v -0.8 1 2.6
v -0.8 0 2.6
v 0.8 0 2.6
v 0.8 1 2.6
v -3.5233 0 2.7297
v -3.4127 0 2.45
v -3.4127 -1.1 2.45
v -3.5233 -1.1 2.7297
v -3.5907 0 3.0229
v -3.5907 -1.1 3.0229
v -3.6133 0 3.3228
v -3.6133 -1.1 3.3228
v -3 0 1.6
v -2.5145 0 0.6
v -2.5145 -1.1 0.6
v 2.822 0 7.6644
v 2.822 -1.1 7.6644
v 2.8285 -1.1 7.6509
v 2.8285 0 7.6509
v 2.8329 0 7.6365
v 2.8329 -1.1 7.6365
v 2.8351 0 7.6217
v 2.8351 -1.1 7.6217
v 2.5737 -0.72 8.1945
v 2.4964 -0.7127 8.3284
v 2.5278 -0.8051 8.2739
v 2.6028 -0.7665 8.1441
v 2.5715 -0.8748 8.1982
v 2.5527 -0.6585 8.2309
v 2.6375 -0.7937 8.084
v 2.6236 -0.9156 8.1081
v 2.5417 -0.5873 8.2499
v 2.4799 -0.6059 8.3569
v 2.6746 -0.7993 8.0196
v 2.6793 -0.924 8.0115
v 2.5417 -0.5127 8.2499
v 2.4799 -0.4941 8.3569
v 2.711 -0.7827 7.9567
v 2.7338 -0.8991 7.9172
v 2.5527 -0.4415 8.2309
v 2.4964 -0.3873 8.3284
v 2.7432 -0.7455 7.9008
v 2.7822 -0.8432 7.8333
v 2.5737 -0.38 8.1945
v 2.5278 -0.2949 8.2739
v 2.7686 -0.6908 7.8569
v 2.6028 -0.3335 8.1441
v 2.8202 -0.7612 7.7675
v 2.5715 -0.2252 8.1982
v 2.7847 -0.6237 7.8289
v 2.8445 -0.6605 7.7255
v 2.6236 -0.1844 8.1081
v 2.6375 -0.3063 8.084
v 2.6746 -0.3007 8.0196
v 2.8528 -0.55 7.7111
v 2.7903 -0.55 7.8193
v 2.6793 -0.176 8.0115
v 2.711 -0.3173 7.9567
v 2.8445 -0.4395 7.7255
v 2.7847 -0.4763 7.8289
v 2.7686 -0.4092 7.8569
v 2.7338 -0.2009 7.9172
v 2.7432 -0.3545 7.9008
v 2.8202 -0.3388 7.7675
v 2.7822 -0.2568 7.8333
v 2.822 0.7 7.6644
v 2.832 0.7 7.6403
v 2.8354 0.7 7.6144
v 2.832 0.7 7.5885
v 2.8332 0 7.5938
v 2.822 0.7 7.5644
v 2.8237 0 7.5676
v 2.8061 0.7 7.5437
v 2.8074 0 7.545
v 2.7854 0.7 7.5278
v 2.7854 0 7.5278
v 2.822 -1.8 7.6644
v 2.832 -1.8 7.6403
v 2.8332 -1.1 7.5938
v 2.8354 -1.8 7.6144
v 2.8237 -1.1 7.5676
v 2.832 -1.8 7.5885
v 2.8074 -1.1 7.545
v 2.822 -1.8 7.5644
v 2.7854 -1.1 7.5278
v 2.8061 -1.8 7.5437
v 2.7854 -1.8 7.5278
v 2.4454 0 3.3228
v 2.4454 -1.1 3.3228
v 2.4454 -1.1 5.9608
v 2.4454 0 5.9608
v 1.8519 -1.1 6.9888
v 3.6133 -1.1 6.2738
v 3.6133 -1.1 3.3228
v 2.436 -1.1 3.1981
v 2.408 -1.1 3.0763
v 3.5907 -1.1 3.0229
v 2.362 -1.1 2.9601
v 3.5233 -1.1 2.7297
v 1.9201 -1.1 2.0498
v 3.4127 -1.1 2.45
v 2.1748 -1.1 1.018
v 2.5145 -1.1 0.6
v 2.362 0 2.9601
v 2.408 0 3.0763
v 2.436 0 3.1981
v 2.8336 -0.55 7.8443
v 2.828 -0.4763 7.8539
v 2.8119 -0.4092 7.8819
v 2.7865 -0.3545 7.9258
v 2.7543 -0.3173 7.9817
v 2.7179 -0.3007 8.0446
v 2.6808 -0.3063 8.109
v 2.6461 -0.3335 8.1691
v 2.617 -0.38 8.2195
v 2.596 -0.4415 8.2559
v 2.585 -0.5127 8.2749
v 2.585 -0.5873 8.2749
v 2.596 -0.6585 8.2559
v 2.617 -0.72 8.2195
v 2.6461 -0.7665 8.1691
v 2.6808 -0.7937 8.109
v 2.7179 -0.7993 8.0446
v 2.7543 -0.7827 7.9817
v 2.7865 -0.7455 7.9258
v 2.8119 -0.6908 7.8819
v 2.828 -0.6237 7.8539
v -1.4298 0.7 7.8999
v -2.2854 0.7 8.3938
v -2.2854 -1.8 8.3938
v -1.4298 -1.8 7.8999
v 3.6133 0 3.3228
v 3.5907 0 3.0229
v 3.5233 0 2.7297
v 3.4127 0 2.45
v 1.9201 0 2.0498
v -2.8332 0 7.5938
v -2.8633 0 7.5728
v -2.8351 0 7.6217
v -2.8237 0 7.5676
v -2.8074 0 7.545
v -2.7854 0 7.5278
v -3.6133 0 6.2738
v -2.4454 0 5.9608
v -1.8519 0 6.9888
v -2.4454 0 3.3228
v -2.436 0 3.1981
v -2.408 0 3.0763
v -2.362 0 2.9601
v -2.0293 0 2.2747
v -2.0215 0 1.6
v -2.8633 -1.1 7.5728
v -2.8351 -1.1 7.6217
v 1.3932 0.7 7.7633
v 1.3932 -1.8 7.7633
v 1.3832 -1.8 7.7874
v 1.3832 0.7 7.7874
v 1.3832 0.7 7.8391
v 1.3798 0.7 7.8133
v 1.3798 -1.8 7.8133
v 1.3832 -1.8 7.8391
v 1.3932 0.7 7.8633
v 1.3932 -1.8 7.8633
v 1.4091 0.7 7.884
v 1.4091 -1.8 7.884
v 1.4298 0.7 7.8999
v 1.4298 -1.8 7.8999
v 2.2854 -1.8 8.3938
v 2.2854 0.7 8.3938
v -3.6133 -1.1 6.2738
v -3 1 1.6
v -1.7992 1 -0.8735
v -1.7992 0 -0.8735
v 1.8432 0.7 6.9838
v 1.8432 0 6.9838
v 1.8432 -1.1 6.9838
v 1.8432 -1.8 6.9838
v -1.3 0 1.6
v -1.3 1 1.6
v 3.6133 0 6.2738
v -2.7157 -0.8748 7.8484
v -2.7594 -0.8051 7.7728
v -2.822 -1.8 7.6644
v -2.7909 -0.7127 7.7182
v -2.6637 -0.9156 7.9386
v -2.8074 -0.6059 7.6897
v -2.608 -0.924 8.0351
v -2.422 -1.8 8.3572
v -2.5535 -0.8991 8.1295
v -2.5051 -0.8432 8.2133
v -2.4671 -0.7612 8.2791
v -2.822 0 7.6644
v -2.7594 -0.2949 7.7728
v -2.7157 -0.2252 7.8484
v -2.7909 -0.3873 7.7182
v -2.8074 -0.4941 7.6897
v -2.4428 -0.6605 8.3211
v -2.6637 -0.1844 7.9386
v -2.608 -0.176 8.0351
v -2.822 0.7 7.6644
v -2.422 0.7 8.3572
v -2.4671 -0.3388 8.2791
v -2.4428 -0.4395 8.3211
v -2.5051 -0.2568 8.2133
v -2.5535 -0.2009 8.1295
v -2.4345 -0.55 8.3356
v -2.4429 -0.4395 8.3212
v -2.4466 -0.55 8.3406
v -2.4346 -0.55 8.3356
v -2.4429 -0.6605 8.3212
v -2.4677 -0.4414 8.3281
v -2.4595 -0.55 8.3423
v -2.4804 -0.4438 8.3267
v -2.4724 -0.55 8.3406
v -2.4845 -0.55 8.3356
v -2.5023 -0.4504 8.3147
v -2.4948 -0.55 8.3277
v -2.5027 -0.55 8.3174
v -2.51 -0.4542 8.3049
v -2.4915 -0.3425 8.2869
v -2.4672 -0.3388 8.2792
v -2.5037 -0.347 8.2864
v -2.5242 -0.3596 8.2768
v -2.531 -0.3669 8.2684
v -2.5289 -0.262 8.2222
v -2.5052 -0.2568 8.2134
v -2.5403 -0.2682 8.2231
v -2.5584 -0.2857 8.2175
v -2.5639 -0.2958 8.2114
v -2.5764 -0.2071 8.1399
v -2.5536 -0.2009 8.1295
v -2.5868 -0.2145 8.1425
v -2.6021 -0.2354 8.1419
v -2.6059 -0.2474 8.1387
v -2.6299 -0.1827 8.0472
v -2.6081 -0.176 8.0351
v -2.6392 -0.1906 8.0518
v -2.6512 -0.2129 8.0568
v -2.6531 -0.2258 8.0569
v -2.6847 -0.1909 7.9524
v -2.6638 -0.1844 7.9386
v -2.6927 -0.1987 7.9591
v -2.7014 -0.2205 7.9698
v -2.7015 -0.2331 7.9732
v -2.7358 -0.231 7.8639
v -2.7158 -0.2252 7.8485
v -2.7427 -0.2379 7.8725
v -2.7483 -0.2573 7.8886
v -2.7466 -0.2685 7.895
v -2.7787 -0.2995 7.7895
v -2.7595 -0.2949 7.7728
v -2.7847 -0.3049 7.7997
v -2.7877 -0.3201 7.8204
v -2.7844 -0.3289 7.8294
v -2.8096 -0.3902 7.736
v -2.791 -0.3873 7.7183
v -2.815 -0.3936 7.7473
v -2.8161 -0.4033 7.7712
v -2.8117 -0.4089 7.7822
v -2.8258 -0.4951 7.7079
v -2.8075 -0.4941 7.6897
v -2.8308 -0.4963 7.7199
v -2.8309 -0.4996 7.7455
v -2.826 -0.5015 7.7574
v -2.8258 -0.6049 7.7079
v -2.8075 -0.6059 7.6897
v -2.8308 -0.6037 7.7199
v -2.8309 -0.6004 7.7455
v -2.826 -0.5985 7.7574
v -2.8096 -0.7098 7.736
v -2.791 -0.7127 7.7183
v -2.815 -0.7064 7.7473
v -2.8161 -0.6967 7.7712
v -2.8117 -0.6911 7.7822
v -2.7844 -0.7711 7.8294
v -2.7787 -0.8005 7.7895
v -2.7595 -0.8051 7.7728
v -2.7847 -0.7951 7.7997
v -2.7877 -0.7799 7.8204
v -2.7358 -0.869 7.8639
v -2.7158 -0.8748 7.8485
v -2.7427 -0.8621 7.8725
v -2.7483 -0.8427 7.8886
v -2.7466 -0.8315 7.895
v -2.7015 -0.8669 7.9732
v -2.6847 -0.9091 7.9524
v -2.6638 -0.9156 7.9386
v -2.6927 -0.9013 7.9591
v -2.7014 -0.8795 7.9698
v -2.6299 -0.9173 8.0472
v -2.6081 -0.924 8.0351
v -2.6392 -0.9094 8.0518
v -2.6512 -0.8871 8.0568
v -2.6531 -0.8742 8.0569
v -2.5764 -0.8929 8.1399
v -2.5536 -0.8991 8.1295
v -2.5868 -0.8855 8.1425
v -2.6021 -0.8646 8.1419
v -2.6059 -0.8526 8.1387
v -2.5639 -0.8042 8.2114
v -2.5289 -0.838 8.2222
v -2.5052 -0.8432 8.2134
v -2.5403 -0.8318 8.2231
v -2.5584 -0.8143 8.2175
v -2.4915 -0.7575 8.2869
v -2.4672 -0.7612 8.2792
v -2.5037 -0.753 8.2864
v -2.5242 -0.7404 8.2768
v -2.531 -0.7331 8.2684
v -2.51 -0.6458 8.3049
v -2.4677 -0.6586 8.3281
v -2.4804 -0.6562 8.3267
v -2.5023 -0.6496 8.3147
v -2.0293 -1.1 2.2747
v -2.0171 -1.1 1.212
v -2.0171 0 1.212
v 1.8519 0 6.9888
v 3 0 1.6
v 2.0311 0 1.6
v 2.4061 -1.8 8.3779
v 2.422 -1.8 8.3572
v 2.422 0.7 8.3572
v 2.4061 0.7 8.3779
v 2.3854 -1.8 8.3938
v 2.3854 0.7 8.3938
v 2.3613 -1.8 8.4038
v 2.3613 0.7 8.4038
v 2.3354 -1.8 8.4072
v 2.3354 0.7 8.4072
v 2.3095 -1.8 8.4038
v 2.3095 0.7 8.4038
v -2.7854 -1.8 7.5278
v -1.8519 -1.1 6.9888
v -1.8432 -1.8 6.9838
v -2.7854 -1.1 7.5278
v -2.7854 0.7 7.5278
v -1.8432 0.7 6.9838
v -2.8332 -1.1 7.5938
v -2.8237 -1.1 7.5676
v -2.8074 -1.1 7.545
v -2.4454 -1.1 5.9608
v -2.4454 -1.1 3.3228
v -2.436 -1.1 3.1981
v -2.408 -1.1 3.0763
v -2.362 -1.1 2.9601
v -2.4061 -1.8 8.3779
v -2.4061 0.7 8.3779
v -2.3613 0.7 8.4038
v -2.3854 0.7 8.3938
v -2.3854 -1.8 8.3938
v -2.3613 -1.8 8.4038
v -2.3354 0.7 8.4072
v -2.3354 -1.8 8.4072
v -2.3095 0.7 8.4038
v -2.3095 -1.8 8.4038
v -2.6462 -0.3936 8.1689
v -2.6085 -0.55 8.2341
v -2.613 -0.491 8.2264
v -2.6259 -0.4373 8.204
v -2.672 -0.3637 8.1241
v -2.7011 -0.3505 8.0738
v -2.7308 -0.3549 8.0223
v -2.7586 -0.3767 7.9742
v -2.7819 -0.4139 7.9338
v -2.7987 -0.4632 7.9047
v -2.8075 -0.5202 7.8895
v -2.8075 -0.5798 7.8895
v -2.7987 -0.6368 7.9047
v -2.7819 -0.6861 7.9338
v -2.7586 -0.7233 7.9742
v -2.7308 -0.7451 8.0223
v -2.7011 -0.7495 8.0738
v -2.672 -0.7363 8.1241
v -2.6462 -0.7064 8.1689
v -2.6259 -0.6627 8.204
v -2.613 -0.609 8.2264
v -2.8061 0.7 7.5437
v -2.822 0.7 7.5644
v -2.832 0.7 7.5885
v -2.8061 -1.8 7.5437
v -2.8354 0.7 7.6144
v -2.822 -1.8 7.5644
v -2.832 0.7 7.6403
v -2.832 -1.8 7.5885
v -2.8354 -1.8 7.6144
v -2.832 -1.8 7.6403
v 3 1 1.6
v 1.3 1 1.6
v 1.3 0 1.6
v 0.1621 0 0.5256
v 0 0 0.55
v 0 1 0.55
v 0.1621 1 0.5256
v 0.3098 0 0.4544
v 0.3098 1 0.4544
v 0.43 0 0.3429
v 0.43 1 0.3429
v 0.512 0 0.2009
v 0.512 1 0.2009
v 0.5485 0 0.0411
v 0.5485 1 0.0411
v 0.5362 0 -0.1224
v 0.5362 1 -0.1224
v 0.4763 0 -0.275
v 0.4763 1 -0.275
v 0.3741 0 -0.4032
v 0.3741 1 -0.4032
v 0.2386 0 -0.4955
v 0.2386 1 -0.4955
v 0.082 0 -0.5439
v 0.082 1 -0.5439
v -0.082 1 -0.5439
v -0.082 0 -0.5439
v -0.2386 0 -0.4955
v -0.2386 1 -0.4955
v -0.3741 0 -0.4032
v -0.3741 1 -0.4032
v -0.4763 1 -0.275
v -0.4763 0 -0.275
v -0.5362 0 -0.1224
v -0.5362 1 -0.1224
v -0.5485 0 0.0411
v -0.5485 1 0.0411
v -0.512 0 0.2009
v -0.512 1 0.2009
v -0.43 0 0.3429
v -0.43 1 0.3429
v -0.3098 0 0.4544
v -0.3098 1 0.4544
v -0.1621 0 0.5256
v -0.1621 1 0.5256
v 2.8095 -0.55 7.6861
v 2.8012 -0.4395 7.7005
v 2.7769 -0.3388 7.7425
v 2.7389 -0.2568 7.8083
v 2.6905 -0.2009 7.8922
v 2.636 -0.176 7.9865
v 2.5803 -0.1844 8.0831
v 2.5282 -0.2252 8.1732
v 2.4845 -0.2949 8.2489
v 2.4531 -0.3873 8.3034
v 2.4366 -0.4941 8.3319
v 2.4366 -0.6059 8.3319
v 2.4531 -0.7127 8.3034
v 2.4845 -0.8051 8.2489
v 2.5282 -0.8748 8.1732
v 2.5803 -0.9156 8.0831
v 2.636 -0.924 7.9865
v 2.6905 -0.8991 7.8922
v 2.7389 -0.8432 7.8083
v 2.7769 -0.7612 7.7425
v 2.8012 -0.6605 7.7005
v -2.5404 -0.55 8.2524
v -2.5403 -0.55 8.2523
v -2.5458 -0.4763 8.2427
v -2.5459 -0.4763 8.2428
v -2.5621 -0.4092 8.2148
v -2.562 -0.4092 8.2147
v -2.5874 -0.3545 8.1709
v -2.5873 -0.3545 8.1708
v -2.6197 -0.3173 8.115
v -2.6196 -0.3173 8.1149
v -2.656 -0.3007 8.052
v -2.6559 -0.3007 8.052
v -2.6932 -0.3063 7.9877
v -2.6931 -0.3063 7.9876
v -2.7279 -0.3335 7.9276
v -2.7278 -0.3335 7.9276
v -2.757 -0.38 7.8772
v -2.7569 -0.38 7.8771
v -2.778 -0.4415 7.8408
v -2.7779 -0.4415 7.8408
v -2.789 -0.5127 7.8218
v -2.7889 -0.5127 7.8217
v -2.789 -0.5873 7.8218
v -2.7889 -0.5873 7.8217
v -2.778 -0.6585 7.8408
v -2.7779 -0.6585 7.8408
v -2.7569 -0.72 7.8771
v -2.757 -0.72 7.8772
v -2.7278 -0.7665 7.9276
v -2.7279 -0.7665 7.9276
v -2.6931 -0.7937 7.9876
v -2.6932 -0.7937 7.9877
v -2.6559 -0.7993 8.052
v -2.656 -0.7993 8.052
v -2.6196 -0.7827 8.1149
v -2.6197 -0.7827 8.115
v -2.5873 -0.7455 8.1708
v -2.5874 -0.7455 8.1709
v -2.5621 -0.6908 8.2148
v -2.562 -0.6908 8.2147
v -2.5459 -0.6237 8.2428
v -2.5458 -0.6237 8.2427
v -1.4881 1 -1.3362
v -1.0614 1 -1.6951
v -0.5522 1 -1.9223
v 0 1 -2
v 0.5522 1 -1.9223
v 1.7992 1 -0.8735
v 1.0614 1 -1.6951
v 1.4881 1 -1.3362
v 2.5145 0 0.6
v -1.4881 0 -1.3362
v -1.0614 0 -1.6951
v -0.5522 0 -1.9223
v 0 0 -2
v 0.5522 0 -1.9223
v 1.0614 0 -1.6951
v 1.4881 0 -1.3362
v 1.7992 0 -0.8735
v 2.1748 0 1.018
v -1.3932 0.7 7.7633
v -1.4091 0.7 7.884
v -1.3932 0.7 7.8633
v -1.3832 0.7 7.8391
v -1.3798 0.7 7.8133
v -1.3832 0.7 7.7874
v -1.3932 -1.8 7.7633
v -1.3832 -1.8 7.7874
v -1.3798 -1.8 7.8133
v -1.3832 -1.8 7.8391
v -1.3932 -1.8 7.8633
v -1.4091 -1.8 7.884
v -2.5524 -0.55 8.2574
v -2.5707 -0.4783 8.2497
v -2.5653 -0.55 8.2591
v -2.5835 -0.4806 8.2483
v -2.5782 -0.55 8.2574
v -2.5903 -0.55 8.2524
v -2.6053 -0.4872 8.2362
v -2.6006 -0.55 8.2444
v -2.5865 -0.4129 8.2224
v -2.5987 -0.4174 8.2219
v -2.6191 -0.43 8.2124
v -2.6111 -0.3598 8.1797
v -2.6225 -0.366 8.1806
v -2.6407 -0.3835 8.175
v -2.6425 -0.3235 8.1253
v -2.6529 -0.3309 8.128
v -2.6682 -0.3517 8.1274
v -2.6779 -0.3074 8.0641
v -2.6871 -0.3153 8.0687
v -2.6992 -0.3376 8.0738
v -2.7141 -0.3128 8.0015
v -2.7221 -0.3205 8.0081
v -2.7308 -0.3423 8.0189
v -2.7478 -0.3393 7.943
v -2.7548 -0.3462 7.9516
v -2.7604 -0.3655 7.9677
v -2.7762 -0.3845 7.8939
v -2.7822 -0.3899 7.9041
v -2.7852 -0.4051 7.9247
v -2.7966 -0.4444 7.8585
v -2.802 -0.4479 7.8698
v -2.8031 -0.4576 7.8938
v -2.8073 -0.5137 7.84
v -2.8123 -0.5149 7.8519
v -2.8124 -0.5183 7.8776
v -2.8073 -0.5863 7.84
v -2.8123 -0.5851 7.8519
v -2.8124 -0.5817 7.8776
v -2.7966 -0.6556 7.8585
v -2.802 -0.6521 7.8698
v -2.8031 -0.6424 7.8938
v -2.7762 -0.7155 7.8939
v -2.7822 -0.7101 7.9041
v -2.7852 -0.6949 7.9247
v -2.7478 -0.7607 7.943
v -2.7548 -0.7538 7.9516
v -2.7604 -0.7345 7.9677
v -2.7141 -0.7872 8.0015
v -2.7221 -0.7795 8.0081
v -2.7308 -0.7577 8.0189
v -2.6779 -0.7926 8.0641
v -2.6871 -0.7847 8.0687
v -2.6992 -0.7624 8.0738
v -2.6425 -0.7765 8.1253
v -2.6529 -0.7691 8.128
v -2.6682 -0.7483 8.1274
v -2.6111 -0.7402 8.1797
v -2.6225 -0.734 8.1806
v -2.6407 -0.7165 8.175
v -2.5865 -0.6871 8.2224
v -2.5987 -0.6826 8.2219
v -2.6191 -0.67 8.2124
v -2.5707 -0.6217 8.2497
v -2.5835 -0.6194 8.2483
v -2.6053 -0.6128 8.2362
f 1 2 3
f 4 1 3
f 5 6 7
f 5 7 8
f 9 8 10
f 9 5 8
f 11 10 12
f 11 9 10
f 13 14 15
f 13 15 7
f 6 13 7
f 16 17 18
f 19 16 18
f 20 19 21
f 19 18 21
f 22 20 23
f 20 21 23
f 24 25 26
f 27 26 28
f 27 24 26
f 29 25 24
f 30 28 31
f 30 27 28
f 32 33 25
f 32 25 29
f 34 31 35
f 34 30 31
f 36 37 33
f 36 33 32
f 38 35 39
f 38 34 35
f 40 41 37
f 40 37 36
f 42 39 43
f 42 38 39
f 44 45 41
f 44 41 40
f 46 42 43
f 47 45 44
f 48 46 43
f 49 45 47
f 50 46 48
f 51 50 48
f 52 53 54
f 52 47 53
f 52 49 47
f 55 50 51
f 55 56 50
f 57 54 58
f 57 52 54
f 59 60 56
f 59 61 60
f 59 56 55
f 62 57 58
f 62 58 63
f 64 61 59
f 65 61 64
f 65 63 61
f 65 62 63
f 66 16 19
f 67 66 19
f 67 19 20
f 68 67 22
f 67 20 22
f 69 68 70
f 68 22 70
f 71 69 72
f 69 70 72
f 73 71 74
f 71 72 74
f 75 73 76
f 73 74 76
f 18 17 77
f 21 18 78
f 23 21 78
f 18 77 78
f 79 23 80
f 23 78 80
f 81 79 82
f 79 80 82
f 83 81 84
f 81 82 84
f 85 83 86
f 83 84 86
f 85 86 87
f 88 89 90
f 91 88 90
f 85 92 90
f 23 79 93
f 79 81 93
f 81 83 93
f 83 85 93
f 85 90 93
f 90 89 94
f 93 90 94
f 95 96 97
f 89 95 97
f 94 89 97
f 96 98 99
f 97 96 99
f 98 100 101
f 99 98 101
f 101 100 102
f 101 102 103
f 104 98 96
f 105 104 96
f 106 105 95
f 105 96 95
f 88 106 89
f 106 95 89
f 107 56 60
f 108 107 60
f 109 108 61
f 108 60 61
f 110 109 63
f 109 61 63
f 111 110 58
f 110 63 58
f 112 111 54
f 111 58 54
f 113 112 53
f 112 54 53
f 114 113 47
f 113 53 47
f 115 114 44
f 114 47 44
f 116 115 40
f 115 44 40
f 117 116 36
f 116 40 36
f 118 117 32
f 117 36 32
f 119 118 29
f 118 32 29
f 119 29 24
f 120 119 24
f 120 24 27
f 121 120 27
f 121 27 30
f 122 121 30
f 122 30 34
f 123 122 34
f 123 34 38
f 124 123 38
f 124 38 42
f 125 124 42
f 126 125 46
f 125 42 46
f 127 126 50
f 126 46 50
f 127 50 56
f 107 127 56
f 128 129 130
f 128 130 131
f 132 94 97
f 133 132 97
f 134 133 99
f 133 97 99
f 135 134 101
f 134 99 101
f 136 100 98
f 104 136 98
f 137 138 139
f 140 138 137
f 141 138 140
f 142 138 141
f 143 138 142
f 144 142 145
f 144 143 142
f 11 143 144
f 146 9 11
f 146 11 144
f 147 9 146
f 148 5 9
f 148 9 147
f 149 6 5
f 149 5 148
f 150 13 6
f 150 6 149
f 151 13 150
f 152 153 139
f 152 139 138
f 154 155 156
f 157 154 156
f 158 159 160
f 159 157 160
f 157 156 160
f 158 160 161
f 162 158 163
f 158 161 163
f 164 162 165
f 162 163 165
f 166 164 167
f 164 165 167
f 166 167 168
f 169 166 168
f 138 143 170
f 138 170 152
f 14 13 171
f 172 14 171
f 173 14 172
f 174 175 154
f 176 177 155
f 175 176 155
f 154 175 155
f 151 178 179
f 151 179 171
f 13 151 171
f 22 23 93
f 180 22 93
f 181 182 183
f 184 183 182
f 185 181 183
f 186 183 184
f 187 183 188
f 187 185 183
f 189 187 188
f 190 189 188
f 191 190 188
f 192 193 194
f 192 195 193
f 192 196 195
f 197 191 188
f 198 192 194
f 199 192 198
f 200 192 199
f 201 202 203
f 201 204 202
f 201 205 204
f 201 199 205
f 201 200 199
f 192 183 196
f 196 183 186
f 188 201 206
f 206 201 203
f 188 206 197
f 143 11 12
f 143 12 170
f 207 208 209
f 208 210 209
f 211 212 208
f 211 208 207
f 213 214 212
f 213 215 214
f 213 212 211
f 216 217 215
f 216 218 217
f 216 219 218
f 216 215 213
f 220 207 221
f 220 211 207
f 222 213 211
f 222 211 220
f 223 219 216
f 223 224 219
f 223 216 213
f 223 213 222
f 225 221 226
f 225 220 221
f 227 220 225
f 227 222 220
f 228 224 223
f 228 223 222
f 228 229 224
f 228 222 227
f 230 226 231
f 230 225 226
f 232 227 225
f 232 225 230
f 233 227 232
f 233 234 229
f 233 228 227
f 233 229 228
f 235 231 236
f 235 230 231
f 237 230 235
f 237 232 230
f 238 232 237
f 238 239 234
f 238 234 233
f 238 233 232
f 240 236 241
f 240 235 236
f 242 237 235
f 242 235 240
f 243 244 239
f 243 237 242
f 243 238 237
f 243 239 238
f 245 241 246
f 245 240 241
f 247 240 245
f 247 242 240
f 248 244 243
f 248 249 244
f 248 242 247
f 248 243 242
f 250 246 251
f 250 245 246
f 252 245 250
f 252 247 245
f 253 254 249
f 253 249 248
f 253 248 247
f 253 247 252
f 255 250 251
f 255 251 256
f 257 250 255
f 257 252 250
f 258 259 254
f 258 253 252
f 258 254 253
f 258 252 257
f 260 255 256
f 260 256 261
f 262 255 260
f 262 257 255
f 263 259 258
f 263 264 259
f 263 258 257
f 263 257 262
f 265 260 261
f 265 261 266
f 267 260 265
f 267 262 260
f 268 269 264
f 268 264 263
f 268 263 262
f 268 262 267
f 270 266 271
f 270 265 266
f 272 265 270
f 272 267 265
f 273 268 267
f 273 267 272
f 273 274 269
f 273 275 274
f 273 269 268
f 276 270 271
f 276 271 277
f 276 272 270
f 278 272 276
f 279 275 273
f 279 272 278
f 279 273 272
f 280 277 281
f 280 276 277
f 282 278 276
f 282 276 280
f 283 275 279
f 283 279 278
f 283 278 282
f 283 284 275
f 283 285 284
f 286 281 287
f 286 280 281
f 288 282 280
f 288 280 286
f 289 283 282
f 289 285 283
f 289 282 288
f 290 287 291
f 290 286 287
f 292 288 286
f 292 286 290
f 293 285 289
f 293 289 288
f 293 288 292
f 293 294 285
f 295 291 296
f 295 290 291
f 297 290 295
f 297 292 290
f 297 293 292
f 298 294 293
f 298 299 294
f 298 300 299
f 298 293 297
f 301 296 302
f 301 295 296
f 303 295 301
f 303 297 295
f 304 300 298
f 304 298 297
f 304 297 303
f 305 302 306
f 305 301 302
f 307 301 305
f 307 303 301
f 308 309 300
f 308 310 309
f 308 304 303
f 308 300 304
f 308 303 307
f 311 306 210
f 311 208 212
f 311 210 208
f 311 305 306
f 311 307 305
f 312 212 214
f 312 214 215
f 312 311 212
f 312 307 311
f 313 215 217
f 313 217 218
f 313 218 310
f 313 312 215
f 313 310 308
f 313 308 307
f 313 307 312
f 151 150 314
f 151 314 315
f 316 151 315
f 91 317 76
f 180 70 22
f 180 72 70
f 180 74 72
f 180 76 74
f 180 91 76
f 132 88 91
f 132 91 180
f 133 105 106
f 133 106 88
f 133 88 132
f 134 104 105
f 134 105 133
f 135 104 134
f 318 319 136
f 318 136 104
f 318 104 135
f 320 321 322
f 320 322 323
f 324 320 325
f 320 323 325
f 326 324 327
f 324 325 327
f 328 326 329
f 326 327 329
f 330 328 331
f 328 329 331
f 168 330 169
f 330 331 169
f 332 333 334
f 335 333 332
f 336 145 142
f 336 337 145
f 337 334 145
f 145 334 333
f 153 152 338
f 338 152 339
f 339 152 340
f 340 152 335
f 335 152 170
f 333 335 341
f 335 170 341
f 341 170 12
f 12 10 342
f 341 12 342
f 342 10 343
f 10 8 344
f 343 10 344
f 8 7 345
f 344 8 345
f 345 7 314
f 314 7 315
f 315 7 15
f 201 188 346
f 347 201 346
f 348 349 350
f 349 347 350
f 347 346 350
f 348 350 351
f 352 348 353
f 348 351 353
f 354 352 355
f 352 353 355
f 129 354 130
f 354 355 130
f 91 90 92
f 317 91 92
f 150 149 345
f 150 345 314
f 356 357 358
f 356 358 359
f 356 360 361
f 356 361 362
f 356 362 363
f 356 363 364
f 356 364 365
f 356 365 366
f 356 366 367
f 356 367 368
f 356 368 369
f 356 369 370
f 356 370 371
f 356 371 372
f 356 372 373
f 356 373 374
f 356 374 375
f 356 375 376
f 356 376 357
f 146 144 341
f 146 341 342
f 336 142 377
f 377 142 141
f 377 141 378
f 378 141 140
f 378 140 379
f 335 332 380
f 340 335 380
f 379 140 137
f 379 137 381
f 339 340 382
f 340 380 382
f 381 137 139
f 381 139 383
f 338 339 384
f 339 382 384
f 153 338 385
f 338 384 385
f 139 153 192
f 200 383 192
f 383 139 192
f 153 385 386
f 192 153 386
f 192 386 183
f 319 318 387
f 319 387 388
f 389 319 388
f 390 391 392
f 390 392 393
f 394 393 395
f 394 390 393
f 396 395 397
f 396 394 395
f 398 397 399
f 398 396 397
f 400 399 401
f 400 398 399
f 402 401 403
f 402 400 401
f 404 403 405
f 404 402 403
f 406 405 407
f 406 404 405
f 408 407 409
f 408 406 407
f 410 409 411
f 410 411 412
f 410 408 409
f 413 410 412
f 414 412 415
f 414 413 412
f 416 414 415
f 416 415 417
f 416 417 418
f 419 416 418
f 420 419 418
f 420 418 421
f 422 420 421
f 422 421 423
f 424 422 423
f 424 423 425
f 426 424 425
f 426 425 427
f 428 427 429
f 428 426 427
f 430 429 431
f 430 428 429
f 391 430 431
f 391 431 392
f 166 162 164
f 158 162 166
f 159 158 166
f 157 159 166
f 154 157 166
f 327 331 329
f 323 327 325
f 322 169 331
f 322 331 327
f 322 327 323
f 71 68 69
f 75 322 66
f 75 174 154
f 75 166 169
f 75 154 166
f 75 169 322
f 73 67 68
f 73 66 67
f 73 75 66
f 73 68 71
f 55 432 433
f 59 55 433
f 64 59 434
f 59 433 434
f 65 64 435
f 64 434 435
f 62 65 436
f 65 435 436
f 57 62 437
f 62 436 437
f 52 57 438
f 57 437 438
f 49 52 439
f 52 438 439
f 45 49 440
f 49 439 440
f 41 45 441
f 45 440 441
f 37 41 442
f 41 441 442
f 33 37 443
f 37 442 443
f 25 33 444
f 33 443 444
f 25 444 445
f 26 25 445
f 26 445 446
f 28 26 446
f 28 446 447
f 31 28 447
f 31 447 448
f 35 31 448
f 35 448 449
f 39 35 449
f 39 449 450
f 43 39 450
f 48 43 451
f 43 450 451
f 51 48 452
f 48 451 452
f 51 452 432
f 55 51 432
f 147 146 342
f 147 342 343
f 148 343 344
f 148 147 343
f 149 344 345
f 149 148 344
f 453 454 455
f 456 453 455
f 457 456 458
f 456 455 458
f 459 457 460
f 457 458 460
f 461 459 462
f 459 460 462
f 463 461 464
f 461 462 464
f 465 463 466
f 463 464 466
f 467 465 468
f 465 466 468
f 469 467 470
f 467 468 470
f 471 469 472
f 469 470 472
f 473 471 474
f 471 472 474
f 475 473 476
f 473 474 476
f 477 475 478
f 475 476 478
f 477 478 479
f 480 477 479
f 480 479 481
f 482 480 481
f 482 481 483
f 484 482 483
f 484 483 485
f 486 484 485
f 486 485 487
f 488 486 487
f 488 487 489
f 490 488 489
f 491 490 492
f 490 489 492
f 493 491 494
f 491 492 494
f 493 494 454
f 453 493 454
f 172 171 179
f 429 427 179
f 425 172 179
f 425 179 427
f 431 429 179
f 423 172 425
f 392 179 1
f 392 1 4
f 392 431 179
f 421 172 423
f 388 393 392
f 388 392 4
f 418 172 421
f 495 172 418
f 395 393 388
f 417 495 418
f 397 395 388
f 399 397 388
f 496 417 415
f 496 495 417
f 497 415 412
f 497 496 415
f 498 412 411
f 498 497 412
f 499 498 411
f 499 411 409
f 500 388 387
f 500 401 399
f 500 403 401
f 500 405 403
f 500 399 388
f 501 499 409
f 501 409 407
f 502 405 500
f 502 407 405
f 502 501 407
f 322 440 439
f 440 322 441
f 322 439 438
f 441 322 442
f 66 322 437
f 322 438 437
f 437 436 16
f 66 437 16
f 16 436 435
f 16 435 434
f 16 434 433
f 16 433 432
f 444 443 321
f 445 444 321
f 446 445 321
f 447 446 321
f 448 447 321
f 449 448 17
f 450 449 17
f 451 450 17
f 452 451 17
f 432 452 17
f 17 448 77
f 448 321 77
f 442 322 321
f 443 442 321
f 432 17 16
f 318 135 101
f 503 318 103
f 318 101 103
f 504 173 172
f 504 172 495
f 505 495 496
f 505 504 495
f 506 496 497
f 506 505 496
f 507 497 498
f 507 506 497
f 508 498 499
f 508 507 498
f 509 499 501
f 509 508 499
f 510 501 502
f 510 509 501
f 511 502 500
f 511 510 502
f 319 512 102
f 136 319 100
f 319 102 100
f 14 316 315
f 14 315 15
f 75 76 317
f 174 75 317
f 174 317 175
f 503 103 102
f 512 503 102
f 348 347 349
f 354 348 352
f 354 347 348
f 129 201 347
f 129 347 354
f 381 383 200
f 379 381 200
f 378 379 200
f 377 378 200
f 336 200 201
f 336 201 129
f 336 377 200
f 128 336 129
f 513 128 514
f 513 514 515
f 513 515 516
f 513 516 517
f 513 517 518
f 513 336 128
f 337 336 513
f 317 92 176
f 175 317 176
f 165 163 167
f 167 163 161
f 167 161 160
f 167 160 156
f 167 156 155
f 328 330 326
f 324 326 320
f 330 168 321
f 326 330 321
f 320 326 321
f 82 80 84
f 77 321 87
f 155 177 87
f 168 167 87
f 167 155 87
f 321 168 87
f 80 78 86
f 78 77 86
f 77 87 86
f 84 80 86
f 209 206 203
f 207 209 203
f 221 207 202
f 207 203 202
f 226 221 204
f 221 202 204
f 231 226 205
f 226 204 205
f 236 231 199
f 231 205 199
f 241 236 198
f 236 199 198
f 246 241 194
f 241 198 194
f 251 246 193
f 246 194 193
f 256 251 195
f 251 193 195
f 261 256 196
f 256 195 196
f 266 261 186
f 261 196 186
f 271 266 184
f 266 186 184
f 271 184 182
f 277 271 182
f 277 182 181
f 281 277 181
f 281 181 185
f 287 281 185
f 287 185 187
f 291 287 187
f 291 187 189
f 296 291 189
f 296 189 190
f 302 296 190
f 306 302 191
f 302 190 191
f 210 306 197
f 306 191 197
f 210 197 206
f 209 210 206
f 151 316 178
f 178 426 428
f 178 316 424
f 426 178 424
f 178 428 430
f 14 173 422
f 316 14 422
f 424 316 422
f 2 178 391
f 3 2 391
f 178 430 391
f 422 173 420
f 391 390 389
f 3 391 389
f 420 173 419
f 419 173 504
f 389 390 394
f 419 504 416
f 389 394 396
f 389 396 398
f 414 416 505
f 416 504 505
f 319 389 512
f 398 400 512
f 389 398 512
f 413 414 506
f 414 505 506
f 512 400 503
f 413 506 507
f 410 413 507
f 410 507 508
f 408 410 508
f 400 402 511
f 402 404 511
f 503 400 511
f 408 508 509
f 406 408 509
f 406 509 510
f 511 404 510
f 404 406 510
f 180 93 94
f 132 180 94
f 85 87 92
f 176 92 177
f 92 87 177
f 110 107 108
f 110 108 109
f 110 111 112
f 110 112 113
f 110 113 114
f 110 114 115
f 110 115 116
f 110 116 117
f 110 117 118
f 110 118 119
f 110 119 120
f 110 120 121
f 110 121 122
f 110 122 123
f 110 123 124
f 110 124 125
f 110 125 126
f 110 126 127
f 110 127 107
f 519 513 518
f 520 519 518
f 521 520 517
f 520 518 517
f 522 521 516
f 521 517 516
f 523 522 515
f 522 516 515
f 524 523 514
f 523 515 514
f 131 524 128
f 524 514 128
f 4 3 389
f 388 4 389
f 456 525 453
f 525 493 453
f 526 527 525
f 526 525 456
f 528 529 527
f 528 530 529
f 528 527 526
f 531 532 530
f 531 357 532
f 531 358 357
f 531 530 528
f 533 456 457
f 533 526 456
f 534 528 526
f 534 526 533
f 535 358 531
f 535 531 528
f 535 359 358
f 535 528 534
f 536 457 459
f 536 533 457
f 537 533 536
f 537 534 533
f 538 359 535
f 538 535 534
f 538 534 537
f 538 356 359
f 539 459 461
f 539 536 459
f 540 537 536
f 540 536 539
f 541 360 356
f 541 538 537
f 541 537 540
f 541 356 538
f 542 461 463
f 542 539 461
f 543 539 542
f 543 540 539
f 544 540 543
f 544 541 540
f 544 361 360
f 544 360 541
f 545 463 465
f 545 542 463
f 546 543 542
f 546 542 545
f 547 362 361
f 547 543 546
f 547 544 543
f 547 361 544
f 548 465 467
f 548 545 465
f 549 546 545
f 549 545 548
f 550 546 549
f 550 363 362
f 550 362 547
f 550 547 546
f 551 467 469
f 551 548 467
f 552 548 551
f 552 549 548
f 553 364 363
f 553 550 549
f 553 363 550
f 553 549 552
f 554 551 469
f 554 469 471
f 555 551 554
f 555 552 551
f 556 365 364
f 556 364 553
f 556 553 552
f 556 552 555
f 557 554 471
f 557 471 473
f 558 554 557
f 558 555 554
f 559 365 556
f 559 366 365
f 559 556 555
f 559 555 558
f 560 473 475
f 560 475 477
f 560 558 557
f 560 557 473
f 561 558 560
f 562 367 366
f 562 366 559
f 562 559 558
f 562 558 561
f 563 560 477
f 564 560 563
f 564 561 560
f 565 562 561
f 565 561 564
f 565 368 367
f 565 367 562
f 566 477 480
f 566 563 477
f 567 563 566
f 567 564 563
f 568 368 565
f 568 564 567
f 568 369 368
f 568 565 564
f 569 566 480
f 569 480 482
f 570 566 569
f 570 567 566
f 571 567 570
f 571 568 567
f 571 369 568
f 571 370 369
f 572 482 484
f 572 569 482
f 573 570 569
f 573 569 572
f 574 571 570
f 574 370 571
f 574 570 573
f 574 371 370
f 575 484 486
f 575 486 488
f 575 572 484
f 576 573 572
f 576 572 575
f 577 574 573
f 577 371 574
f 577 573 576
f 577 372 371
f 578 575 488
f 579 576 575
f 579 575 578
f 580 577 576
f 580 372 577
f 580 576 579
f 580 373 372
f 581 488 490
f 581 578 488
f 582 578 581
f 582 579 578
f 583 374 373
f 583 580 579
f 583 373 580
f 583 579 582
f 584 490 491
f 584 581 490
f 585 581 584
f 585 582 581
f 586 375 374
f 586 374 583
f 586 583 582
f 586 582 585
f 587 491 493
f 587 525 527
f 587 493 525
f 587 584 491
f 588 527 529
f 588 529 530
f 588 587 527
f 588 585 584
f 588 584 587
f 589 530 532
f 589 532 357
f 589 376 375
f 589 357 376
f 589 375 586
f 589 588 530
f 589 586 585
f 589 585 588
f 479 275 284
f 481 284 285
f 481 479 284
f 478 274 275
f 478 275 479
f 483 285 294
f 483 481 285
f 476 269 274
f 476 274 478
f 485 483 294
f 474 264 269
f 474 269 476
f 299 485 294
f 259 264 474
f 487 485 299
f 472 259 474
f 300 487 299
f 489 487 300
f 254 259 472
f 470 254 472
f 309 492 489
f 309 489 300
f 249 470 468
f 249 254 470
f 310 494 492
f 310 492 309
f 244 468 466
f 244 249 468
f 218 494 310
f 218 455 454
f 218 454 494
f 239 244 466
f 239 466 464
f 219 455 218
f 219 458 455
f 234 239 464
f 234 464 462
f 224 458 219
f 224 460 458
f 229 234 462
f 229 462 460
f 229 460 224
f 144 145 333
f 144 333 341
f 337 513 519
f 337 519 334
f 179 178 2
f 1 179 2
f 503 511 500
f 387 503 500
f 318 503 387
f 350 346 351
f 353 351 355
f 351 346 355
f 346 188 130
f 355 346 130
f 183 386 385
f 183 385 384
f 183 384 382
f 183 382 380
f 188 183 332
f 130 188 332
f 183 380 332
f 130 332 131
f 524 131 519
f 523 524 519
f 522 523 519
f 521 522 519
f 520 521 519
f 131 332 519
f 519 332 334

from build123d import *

# Parameters (mm, degrees)
SKETCH1_R           = 0.55
BOSS_EXTRUDE1_DEPTH = 1
BOSS_EXTRUDE3_DEPTH = 1.1
BOSS_EXTRUDE4_DEPTH = 1.25
SKETCH5_R           = 0.375
BOSS_EXTRUDE5_DEPTH = 0.05
SKETCH6_R           = 0.25
BOSS_EXTRUDE6_DEPTH = 0.05
CHAMFER1_SIZE       = 0.75
CHAMFER1_SIZE_2     = 0.5
MIRROR1_START       = -1.1
MIRROR1_DEPTH       = 1.1
MIRROR1_START_2     = -1.8
MIRROR1_2_DEPTH     = 2.5
MIRROR1_START_3     = 6.27611275
MIRROR1_3_OUTLINE_R = 0.375
MIRROR1_3_DEPTH     = 0.05
MIRROR1_START_4     = 6.32611275
MIRROR1_4_OUTLINE_R = 0.25
MIRROR1_4_DEPTH     = 0.05
FILLET2_R           = 0.05
BOSS_EXTRUDE7_DEPTH = 1
FILLET3_R           = 0.1


with BuildPart() as part:
    # Sketch1 → Boss-Extrude1 (new body)
    with BuildSketch(Plane(origin=(0, 0, 0), x_dir=(1, 0, 0), z_dir=(0, 1, 0))):
        with BuildLine():
            Line((-3, -1.6), (-1.799182122, 0.873466479))
            ThreePointArc((-1.799182122, 0.873466479), (0, 2), (1.799182122, 0.873466479))
            Line((1.799182122, 0.873466479), (3, -1.6))
            Line((3, -1.6), (-3, -1.6))
        make_face()
        with Locations(Location((0, 0, 0), (0, 0, 270))):
            Circle(SKETCH1_R, mode=Mode.SUBTRACT)
    extrude(amount=BOSS_EXTRUDE1_DEPTH)

    # Sketch3 → Boss-Extrude3 (add)
    with BuildSketch(Plane(origin=(0, 0, 0), x_dir=(-1, 0, 0), z_dir=(0, -1, 0))):
        with BuildLine():
            Line((2.514520254, -0.6), (3.412657784, -2.45))
            ThreePointArc((3.412657784, -2.45), (3.562510993, -2.875016795), (3.613323348, -3.322803983))
            Line((3.613323348, -3.322803983), (3.613323348, -6.273765877))
            Line((3.613323348, -6.273765877), (2.863323348, -7.572803983))
            Line((2.863323348, -7.572803983), (1.851870719, -6.988841535))
            Line((1.851870719, -6.988841535), (2.445398453, -5.960821345))
            Line((2.445398453, -5.960821345), (2.445398453, -3.322803983))
            ThreePointArc((2.445398453, -3.322803983), (2.424281128, -3.13670618), (2.362002989, -2.960071623))
            Line((2.362002989, -2.960071623), (1.701715763, -1.6))
            Line((1.701715763, -1.6), (2.514520254, -0.6))
        make_face()
    extrude(amount=BOSS_EXTRUDE3_DEPTH)

    # Sketch4 → Boss-Extrude4 (add, symmetric)
    with BuildSketch(Plane(origin=(2.003180044, -0.55, 0.513767997), x_dir=(1, 0, 0), z_dir=(0, 1, 0))):
        Polygon((-3.84639051, -6.470073538), (-4.875163646, -7.064035986), (-4.375163646, -7.930061389), (-3.34639051, -7.336098942), align=None)
    extrude(amount=BOSS_EXTRUDE4_DEPTH, both=True)

    # Sketch5 → Boss-Extrude5 (add)
    with BuildSketch(Plane(origin=(-5.435273078, 0, 3.138056375), x_dir=(0.5000000000000009, 0, 0.8660254037844383), z_dir=(-0.8660254037844382, 0, 0.5000000000000008))):
        with Locations((5.626578953, -0.55)):
            Circle(SKETCH5_R)
    extrude(amount=BOSS_EXTRUDE5_DEPTH)

    # Sketch6 → Boss-Extrude6 (add)
    with BuildSketch(Plane(origin=(-5.478574348, 0, 3.163056375), x_dir=(0.5000000000000008, 0, 0.8660254037844383), z_dir=(-0.8660254037844382, 0, 0.5000000000000007))):
        with Locations((5.626578953, -0.55)):
            Circle(SKETCH6_R)
    extrude(amount=BOSS_EXTRUDE6_DEPTH)

    # Chamfer1
    # the kernel refuses this chamfer: 0.75, 0.5 mm, written as the material it takes off along each edge
    with BuildSketch(Plane(origin=(-1.701715763, 0, 1.6), x_dir=(-0.43673323969900685, 0, 0.899591061172803), z_dir=(0, -1, 0))) as chamfer1_piece_1:
        Polygon((CHAMFER1_SIZE, 0), (-CHAMFER1_SIZE_2 * 0.422618261741, CHAMFER1_SIZE_2 * 0.906307787037), (0, 0), align=None)
    extrude(amount=3.043103543, mode=Mode.SUBTRACT)

    # Mirror1: read off the stored shape, not the designer's step
    # Mirror1 outline → Mirror1 (add)
    with BuildSketch(Plane(origin=(0, 0, 0), x_dir=(1, 0, 0), z_dir=(0, 1, 0)).offset(MIRROR1_START)):
        with BuildLine():
            Line((3.412657784, -2.45), (2.514520254, -0.6))
            Line((2.514520254, -0.6), (2.174766969, -1.01800124))
            Line((2.174766969, -1.01800124), (1.920082383, -2.049795531))
            Line((1.920082383, -2.049795531), (2.362002989, -2.960071623))
            ThreePointArc((2.362002989, -2.960071623), (2.424281128, -3.13670618), (2.445398453, -3.322803983))
            Line((2.445398453, -3.322803983), (2.445398453, -5.960821345))
            Line((2.445398453, -5.960821345), (1.851870719, -6.988841535))
            Line((1.851870719, -6.988841535), (1.843210465, -6.983841535))
            Line((1.843210465, -6.983841535), (1.343210465, -7.849866939))
            Line((1.343210465, -7.849866939), (2.371983602, -8.443829386))
            Line((2.371983602, -8.443829386), (2.871983602, -7.577803983))
            Line((2.871983602, -7.577803983), (2.863323348, -7.572803983))
            Line((2.863323348, -7.572803983), (3.613323348, -6.273765877))
            Line((3.613323348, -6.273765877), (3.613323348, -3.322803983))
            ThreePointArc((3.613323348, -3.322803983), (3.562510993, -2.875016795), (3.412657784, -2.45))
        make_face()
    extrude(amount=MIRROR1_DEPTH)

    # Mirror1 2 outline → Mirror1 2 (add)
    with BuildSketch(Plane(origin=(0, 0, 0), x_dir=(1, 0, 0), z_dir=(0, 1, 0)).offset(MIRROR1_START_2)):
        Polygon((2.871983602, -7.577803983), (1.843210465, -6.983841535), (1.343210465, -7.849866939), (2.371983602, -8.443829386), align=None)
    extrude(amount=MIRROR1_2_DEPTH)

    # Mirror1 3 outline → Mirror1 3 (add)
    with BuildSketch(Plane(origin=(0, 0, 0), x_dir=(0.500000000000001, 0, -0.866025403784438), z_dir=(0.866025403784438, 0, 0.500000000000001)).offset(MIRROR1_START_3)):
        with Locations((-5.626578953, -0.55)):
            Circle(MIRROR1_3_OUTLINE_R)
    extrude(amount=MIRROR1_3_DEPTH)

    # Mirror1 4 outline → Mirror1 4 (add)
    with BuildSketch(Plane(origin=(0, 0, 0), x_dir=(0.500000000000001, 0, -0.866025403784438), z_dir=(0.866025403784438, 0, 0.500000000000001)).offset(MIRROR1_START_4)):
        with Locations((-5.626578953, -0.55)):
            Circle(MIRROR1_4_OUTLINE_R)
    extrude(amount=MIRROR1_4_DEPTH)

    # Fillet2
    fillet2_edges = [part.edges().sort_by_distance(p)[0] for p in [
        (-2.852784872, -0.55, 7.711057158),
        (-2.833586142, -0.55, 7.844310334),
    ]]
    fillet(fillet2_edges, radius=FILLET2_R - 0.0001)  # a hair under: the kernel refuses the full size

    # Sketch7 → Boss-Extrude7 (add)
    with BuildSketch(Plane(origin=(0, 0, 0), x_dir=(1, 0, 0), z_dir=(0, 1, 0))):
        Polygon((-0.8, -2.6), (0.8, -2.6), (1.3, -1.6), (0, -0.8), (-1.3, -1.6), align=None)
    extrude(amount=BOSS_EXTRUDE7_DEPTH)

    # Fillet3
    # the kernel refuses this fillet: 0.1 mm, written as the material it takes off along each edge
    with BuildSketch(Plane(origin=(2.871983602, -1.1, 7.577803983), x_dir=(-0.8660254028383251, 0, -0.5000000016387168), z_dir=(0, 1, 0))) as fillet3_piece_1_section:
        with BuildLine():
            CenterArc((FILLET3_R * 0.9999999985, FILLET3_R), FILLET3_R, 180.000000086, 89.999999914)
            Line((-FILLET3_R * 1.50001067123e-09, FILLET3_R * 0.9999999985), (0, 0))
            Line((0, 0), (FILLET3_R * 0.9999999985, 0))
        make_face()
    fillet3_piece_1 = extrude(amount=1.1, mode=Mode.PRIVATE)
    fillet3_piece_1 = split(fillet3_piece_1, bisect_by=Plane(origin=(2.863323348, -1.1, 7.572803983), z_dir=(0.8660254038383292, 0, 0.49999999990665916)), keep=Keep.TOP, mode=Mode.PRIVATE)
    add(fillet3_piece_1, mode=Mode.SUBTRACT)
    with BuildSketch(Plane(origin=(2.371983602, 0.95, 8.443829386), x_dir=(0.5000000003396727, 0, -0.8660254035883286), z_dir=(0, -1, 0)), Plane(origin=(1.343210465, -2.05, 7.849866939), x_dir=(0.4999999999066601, 0, -0.8660254038383285), z_dir=(0, 1, 0)), Plane(origin=(-2.371983602, -2.05, 8.443829386), x_dir=(-0.5000000000000007, 0, -0.8660254037844383), z_dir=(0, 1, 0))) as fillet3_piece_2:
        with BuildLine():
            CenterArc((FILLET3_R, -FILLET3_R), FILLET3_R, 90, 89.999999953)
            Line((0, -FILLET3_R), (0, 0))
            Line((0, 0), (FILLET3_R, 0))
        make_face()
    extrude(amount=3, mode=Mode.SUBTRACT)
    with BuildSketch(Plane(origin=(-2.871983602, -2.05, 7.577803983), x_dir=(0.5000000000000002, 0, 0.8660254037844386), z_dir=(0, 1, 0))) as fillet3_piece_3_section:
        with BuildLine():
            CenterArc((FILLET3_R, FILLET3_R), FILLET3_R, 180, 90)
            Line((0, FILLET3_R), (0, 0))
            Line((0, 0), (FILLET3_R, 0))
        make_face()
    fillet3_piece_3 = extrude(amount=3, mode=Mode.PRIVATE)
    fillet3_piece_3 = split(fillet3_piece_3, bisect_by=Plane(origin=(-2.871983602, -1.1, 7.577803983), z_dir=(0, -1, 0)), keep=Keep.TOP, mode=Mode.PRIVATE)
    fillet3_piece_3 = split(fillet3_piece_3, bisect_by=Plane(origin=(-2.863323348, -2.05, 7.572803983), z_dir=(-0.8660254037844362, 0, 0.5000000000000044)), keep=Keep.TOP, mode=Mode.PRIVATE)
    add(fillet3_piece_3, mode=Mode.SUBTRACT)
    with BuildSketch(Plane(origin=(-2.871983602, -2.05, 7.577803983), x_dir=(0.5000000000000002, 0, 0.8660254037844386), z_dir=(0, 1, 0))) as fillet3_piece_4_section:
        with BuildLine():
            CenterArc((FILLET3_R, FILLET3_R), FILLET3_R, 180, 90)
            Line((0, FILLET3_R), (0, 0))
            Line((0, 0), (FILLET3_R, 0))
        make_face()
    fillet3_piece_4 = extrude(amount=3, mode=Mode.PRIVATE)
    fillet3_piece_4 = split(fillet3_piece_4, bisect_by=Plane(origin=(-2.871983602, -1.1, 7.577803983), z_dir=(0, -1, 0)), keep=Keep.TOP, mode=Mode.PRIVATE)
    fillet3_piece_4 = split(fillet3_piece_4, bisect_by=Plane(origin=(-2.863323348, -2.05, 7.572803983), z_dir=(0.8660254037844362, 0, -0.5000000000000044)), keep=Keep.TOP, mode=Mode.PRIVATE)
    add(fillet3_piece_4, mode=Mode.SUBTRACT)
    with BuildSketch(Plane(origin=(-2.871983602, -2.05, 7.577803983), x_dir=(0.5000000000000002, 0, 0.8660254037844386), z_dir=(0, 1, 0))) as fillet3_piece_5_section:
        with BuildLine():
            CenterArc((FILLET3_R, FILLET3_R), FILLET3_R, 180, 90)
            Line((0, FILLET3_R), (0, 0))
            Line((0, 0), (FILLET3_R, 0))
        make_face()
    fillet3_piece_5 = extrude(amount=3, mode=Mode.PRIVATE)
    fillet3_piece_5 = split(fillet3_piece_5, bisect_by=Plane(origin=(-2.871983602, 0, 7.577803983), z_dir=(0, -1, 0)), keep=Keep.TOP, mode=Mode.PRIVATE)
    fillet3_piece_5 = split(fillet3_piece_5, bisect_by=Plane(origin=(-2.871983602, -1.1, 7.577803983), z_dir=(0, 1, 0)), keep=Keep.TOP, mode=Mode.PRIVATE)
    fillet3_piece_5 = split(fillet3_piece_5, bisect_by=Plane(origin=(-2.863323348, -2.05, 7.572803983), z_dir=(-0.8660254037844362, 0, 0.5000000000000044)), keep=Keep.TOP, mode=Mode.PRIVATE)
    add(fillet3_piece_5, mode=Mode.SUBTRACT)
    with BuildSketch(Plane(origin=(-2.871983602, -2.05, 7.577803983), x_dir=(0.5000000000000002, 0, 0.8660254037844386), z_dir=(0, 1, 0))) as fillet3_piece_6_section:
        with BuildLine():
            CenterArc((FILLET3_R, FILLET3_R), FILLET3_R, 180, 90)
            Line((0, FILLET3_R), (0, 0))
            Line((0, 0), (FILLET3_R, 0))
        make_face()
    fillet3_piece_6 = extrude(amount=3, mode=Mode.PRIVATE)
    fillet3_piece_6 = split(fillet3_piece_6, bisect_by=Plane(origin=(-2.871983602, 0, 7.577803983), z_dir=(0, 1, 0)), keep=Keep.TOP, mode=Mode.PRIVATE)
    fillet3_piece_6 = split(fillet3_piece_6, bisect_by=Plane(origin=(-2.863323348, -2.05, 7.572803983), z_dir=(-0.8660254037844362, 0, 0.5000000000000044)), keep=Keep.TOP, mode=Mode.PRIVATE)
    add(fillet3_piece_6, mode=Mode.SUBTRACT)
    with BuildSketch(Plane(origin=(-2.871983602, -2.05, 7.577803983), x_dir=(0.5000000000000002, 0, 0.8660254037844386), z_dir=(0, 1, 0))) as fillet3_piece_7_section:
        with BuildLine():
            CenterArc((FILLET3_R, FILLET3_R), FILLET3_R, 180, 90)
            Line((0, FILLET3_R), (0, 0))
            Line((0, 0), (FILLET3_R, 0))
        make_face()
    fillet3_piece_7 = extrude(amount=3, mode=Mode.PRIVATE)
    fillet3_piece_7 = split(fillet3_piece_7, bisect_by=Plane(origin=(-2.871983602, 0, 7.577803983), z_dir=(0, 1, 0)), keep=Keep.TOP, mode=Mode.PRIVATE)
    fillet3_piece_7 = split(fillet3_piece_7, bisect_by=Plane(origin=(-2.863323348, -2.05, 7.572803983), z_dir=(0.8660254037844362, 0, -0.5000000000000044)), keep=Keep.TOP, mode=Mode.PRIVATE)
    add(fillet3_piece_7, mode=Mode.SUBTRACT)
    with BuildSketch(Plane(origin=(-1.343210465, 0.95, 7.849866939), x_dir=(-0.8660254037844438, 0, 0.4999999999999912), z_dir=(0, -1, 0))) as fillet3_piece_8:
        with BuildLine():
            CenterArc((FILLET3_R, FILLET3_R), FILLET3_R, 180, 90)
            Line((0, FILLET3_R), (0, 0))
            Line((0, 0), (FILLET3_R, 0))
        make_face()
    extrude(amount=3, mode=Mode.SUBTRACT)
    with BuildSketch(Plane(origin=(2.871983602, -2.05, 7.577803983), x_dir=(-0.866025403632075, 0, -0.5000000002639015), z_dir=(0, 1, 0)), Plane(origin=(2.871983602, 0, 7.577803983), x_dir=(-0.866025403632075, 0, -0.5000000002639015), z_dir=(0, 1, 0))) as fillet3_piece_9:
        with BuildLine():
            CenterArc((FILLET3_R, FILLET3_R), FILLET3_R, 179.999999995, 90.000000005)
            Line((0, FILLET3_R), (0, 0))
            Line((0, 0), (FILLET3_R, 0))
        make_face()
    extrude(amount=0.95, mode=Mode.SUBTRACT)


solid = part.part
